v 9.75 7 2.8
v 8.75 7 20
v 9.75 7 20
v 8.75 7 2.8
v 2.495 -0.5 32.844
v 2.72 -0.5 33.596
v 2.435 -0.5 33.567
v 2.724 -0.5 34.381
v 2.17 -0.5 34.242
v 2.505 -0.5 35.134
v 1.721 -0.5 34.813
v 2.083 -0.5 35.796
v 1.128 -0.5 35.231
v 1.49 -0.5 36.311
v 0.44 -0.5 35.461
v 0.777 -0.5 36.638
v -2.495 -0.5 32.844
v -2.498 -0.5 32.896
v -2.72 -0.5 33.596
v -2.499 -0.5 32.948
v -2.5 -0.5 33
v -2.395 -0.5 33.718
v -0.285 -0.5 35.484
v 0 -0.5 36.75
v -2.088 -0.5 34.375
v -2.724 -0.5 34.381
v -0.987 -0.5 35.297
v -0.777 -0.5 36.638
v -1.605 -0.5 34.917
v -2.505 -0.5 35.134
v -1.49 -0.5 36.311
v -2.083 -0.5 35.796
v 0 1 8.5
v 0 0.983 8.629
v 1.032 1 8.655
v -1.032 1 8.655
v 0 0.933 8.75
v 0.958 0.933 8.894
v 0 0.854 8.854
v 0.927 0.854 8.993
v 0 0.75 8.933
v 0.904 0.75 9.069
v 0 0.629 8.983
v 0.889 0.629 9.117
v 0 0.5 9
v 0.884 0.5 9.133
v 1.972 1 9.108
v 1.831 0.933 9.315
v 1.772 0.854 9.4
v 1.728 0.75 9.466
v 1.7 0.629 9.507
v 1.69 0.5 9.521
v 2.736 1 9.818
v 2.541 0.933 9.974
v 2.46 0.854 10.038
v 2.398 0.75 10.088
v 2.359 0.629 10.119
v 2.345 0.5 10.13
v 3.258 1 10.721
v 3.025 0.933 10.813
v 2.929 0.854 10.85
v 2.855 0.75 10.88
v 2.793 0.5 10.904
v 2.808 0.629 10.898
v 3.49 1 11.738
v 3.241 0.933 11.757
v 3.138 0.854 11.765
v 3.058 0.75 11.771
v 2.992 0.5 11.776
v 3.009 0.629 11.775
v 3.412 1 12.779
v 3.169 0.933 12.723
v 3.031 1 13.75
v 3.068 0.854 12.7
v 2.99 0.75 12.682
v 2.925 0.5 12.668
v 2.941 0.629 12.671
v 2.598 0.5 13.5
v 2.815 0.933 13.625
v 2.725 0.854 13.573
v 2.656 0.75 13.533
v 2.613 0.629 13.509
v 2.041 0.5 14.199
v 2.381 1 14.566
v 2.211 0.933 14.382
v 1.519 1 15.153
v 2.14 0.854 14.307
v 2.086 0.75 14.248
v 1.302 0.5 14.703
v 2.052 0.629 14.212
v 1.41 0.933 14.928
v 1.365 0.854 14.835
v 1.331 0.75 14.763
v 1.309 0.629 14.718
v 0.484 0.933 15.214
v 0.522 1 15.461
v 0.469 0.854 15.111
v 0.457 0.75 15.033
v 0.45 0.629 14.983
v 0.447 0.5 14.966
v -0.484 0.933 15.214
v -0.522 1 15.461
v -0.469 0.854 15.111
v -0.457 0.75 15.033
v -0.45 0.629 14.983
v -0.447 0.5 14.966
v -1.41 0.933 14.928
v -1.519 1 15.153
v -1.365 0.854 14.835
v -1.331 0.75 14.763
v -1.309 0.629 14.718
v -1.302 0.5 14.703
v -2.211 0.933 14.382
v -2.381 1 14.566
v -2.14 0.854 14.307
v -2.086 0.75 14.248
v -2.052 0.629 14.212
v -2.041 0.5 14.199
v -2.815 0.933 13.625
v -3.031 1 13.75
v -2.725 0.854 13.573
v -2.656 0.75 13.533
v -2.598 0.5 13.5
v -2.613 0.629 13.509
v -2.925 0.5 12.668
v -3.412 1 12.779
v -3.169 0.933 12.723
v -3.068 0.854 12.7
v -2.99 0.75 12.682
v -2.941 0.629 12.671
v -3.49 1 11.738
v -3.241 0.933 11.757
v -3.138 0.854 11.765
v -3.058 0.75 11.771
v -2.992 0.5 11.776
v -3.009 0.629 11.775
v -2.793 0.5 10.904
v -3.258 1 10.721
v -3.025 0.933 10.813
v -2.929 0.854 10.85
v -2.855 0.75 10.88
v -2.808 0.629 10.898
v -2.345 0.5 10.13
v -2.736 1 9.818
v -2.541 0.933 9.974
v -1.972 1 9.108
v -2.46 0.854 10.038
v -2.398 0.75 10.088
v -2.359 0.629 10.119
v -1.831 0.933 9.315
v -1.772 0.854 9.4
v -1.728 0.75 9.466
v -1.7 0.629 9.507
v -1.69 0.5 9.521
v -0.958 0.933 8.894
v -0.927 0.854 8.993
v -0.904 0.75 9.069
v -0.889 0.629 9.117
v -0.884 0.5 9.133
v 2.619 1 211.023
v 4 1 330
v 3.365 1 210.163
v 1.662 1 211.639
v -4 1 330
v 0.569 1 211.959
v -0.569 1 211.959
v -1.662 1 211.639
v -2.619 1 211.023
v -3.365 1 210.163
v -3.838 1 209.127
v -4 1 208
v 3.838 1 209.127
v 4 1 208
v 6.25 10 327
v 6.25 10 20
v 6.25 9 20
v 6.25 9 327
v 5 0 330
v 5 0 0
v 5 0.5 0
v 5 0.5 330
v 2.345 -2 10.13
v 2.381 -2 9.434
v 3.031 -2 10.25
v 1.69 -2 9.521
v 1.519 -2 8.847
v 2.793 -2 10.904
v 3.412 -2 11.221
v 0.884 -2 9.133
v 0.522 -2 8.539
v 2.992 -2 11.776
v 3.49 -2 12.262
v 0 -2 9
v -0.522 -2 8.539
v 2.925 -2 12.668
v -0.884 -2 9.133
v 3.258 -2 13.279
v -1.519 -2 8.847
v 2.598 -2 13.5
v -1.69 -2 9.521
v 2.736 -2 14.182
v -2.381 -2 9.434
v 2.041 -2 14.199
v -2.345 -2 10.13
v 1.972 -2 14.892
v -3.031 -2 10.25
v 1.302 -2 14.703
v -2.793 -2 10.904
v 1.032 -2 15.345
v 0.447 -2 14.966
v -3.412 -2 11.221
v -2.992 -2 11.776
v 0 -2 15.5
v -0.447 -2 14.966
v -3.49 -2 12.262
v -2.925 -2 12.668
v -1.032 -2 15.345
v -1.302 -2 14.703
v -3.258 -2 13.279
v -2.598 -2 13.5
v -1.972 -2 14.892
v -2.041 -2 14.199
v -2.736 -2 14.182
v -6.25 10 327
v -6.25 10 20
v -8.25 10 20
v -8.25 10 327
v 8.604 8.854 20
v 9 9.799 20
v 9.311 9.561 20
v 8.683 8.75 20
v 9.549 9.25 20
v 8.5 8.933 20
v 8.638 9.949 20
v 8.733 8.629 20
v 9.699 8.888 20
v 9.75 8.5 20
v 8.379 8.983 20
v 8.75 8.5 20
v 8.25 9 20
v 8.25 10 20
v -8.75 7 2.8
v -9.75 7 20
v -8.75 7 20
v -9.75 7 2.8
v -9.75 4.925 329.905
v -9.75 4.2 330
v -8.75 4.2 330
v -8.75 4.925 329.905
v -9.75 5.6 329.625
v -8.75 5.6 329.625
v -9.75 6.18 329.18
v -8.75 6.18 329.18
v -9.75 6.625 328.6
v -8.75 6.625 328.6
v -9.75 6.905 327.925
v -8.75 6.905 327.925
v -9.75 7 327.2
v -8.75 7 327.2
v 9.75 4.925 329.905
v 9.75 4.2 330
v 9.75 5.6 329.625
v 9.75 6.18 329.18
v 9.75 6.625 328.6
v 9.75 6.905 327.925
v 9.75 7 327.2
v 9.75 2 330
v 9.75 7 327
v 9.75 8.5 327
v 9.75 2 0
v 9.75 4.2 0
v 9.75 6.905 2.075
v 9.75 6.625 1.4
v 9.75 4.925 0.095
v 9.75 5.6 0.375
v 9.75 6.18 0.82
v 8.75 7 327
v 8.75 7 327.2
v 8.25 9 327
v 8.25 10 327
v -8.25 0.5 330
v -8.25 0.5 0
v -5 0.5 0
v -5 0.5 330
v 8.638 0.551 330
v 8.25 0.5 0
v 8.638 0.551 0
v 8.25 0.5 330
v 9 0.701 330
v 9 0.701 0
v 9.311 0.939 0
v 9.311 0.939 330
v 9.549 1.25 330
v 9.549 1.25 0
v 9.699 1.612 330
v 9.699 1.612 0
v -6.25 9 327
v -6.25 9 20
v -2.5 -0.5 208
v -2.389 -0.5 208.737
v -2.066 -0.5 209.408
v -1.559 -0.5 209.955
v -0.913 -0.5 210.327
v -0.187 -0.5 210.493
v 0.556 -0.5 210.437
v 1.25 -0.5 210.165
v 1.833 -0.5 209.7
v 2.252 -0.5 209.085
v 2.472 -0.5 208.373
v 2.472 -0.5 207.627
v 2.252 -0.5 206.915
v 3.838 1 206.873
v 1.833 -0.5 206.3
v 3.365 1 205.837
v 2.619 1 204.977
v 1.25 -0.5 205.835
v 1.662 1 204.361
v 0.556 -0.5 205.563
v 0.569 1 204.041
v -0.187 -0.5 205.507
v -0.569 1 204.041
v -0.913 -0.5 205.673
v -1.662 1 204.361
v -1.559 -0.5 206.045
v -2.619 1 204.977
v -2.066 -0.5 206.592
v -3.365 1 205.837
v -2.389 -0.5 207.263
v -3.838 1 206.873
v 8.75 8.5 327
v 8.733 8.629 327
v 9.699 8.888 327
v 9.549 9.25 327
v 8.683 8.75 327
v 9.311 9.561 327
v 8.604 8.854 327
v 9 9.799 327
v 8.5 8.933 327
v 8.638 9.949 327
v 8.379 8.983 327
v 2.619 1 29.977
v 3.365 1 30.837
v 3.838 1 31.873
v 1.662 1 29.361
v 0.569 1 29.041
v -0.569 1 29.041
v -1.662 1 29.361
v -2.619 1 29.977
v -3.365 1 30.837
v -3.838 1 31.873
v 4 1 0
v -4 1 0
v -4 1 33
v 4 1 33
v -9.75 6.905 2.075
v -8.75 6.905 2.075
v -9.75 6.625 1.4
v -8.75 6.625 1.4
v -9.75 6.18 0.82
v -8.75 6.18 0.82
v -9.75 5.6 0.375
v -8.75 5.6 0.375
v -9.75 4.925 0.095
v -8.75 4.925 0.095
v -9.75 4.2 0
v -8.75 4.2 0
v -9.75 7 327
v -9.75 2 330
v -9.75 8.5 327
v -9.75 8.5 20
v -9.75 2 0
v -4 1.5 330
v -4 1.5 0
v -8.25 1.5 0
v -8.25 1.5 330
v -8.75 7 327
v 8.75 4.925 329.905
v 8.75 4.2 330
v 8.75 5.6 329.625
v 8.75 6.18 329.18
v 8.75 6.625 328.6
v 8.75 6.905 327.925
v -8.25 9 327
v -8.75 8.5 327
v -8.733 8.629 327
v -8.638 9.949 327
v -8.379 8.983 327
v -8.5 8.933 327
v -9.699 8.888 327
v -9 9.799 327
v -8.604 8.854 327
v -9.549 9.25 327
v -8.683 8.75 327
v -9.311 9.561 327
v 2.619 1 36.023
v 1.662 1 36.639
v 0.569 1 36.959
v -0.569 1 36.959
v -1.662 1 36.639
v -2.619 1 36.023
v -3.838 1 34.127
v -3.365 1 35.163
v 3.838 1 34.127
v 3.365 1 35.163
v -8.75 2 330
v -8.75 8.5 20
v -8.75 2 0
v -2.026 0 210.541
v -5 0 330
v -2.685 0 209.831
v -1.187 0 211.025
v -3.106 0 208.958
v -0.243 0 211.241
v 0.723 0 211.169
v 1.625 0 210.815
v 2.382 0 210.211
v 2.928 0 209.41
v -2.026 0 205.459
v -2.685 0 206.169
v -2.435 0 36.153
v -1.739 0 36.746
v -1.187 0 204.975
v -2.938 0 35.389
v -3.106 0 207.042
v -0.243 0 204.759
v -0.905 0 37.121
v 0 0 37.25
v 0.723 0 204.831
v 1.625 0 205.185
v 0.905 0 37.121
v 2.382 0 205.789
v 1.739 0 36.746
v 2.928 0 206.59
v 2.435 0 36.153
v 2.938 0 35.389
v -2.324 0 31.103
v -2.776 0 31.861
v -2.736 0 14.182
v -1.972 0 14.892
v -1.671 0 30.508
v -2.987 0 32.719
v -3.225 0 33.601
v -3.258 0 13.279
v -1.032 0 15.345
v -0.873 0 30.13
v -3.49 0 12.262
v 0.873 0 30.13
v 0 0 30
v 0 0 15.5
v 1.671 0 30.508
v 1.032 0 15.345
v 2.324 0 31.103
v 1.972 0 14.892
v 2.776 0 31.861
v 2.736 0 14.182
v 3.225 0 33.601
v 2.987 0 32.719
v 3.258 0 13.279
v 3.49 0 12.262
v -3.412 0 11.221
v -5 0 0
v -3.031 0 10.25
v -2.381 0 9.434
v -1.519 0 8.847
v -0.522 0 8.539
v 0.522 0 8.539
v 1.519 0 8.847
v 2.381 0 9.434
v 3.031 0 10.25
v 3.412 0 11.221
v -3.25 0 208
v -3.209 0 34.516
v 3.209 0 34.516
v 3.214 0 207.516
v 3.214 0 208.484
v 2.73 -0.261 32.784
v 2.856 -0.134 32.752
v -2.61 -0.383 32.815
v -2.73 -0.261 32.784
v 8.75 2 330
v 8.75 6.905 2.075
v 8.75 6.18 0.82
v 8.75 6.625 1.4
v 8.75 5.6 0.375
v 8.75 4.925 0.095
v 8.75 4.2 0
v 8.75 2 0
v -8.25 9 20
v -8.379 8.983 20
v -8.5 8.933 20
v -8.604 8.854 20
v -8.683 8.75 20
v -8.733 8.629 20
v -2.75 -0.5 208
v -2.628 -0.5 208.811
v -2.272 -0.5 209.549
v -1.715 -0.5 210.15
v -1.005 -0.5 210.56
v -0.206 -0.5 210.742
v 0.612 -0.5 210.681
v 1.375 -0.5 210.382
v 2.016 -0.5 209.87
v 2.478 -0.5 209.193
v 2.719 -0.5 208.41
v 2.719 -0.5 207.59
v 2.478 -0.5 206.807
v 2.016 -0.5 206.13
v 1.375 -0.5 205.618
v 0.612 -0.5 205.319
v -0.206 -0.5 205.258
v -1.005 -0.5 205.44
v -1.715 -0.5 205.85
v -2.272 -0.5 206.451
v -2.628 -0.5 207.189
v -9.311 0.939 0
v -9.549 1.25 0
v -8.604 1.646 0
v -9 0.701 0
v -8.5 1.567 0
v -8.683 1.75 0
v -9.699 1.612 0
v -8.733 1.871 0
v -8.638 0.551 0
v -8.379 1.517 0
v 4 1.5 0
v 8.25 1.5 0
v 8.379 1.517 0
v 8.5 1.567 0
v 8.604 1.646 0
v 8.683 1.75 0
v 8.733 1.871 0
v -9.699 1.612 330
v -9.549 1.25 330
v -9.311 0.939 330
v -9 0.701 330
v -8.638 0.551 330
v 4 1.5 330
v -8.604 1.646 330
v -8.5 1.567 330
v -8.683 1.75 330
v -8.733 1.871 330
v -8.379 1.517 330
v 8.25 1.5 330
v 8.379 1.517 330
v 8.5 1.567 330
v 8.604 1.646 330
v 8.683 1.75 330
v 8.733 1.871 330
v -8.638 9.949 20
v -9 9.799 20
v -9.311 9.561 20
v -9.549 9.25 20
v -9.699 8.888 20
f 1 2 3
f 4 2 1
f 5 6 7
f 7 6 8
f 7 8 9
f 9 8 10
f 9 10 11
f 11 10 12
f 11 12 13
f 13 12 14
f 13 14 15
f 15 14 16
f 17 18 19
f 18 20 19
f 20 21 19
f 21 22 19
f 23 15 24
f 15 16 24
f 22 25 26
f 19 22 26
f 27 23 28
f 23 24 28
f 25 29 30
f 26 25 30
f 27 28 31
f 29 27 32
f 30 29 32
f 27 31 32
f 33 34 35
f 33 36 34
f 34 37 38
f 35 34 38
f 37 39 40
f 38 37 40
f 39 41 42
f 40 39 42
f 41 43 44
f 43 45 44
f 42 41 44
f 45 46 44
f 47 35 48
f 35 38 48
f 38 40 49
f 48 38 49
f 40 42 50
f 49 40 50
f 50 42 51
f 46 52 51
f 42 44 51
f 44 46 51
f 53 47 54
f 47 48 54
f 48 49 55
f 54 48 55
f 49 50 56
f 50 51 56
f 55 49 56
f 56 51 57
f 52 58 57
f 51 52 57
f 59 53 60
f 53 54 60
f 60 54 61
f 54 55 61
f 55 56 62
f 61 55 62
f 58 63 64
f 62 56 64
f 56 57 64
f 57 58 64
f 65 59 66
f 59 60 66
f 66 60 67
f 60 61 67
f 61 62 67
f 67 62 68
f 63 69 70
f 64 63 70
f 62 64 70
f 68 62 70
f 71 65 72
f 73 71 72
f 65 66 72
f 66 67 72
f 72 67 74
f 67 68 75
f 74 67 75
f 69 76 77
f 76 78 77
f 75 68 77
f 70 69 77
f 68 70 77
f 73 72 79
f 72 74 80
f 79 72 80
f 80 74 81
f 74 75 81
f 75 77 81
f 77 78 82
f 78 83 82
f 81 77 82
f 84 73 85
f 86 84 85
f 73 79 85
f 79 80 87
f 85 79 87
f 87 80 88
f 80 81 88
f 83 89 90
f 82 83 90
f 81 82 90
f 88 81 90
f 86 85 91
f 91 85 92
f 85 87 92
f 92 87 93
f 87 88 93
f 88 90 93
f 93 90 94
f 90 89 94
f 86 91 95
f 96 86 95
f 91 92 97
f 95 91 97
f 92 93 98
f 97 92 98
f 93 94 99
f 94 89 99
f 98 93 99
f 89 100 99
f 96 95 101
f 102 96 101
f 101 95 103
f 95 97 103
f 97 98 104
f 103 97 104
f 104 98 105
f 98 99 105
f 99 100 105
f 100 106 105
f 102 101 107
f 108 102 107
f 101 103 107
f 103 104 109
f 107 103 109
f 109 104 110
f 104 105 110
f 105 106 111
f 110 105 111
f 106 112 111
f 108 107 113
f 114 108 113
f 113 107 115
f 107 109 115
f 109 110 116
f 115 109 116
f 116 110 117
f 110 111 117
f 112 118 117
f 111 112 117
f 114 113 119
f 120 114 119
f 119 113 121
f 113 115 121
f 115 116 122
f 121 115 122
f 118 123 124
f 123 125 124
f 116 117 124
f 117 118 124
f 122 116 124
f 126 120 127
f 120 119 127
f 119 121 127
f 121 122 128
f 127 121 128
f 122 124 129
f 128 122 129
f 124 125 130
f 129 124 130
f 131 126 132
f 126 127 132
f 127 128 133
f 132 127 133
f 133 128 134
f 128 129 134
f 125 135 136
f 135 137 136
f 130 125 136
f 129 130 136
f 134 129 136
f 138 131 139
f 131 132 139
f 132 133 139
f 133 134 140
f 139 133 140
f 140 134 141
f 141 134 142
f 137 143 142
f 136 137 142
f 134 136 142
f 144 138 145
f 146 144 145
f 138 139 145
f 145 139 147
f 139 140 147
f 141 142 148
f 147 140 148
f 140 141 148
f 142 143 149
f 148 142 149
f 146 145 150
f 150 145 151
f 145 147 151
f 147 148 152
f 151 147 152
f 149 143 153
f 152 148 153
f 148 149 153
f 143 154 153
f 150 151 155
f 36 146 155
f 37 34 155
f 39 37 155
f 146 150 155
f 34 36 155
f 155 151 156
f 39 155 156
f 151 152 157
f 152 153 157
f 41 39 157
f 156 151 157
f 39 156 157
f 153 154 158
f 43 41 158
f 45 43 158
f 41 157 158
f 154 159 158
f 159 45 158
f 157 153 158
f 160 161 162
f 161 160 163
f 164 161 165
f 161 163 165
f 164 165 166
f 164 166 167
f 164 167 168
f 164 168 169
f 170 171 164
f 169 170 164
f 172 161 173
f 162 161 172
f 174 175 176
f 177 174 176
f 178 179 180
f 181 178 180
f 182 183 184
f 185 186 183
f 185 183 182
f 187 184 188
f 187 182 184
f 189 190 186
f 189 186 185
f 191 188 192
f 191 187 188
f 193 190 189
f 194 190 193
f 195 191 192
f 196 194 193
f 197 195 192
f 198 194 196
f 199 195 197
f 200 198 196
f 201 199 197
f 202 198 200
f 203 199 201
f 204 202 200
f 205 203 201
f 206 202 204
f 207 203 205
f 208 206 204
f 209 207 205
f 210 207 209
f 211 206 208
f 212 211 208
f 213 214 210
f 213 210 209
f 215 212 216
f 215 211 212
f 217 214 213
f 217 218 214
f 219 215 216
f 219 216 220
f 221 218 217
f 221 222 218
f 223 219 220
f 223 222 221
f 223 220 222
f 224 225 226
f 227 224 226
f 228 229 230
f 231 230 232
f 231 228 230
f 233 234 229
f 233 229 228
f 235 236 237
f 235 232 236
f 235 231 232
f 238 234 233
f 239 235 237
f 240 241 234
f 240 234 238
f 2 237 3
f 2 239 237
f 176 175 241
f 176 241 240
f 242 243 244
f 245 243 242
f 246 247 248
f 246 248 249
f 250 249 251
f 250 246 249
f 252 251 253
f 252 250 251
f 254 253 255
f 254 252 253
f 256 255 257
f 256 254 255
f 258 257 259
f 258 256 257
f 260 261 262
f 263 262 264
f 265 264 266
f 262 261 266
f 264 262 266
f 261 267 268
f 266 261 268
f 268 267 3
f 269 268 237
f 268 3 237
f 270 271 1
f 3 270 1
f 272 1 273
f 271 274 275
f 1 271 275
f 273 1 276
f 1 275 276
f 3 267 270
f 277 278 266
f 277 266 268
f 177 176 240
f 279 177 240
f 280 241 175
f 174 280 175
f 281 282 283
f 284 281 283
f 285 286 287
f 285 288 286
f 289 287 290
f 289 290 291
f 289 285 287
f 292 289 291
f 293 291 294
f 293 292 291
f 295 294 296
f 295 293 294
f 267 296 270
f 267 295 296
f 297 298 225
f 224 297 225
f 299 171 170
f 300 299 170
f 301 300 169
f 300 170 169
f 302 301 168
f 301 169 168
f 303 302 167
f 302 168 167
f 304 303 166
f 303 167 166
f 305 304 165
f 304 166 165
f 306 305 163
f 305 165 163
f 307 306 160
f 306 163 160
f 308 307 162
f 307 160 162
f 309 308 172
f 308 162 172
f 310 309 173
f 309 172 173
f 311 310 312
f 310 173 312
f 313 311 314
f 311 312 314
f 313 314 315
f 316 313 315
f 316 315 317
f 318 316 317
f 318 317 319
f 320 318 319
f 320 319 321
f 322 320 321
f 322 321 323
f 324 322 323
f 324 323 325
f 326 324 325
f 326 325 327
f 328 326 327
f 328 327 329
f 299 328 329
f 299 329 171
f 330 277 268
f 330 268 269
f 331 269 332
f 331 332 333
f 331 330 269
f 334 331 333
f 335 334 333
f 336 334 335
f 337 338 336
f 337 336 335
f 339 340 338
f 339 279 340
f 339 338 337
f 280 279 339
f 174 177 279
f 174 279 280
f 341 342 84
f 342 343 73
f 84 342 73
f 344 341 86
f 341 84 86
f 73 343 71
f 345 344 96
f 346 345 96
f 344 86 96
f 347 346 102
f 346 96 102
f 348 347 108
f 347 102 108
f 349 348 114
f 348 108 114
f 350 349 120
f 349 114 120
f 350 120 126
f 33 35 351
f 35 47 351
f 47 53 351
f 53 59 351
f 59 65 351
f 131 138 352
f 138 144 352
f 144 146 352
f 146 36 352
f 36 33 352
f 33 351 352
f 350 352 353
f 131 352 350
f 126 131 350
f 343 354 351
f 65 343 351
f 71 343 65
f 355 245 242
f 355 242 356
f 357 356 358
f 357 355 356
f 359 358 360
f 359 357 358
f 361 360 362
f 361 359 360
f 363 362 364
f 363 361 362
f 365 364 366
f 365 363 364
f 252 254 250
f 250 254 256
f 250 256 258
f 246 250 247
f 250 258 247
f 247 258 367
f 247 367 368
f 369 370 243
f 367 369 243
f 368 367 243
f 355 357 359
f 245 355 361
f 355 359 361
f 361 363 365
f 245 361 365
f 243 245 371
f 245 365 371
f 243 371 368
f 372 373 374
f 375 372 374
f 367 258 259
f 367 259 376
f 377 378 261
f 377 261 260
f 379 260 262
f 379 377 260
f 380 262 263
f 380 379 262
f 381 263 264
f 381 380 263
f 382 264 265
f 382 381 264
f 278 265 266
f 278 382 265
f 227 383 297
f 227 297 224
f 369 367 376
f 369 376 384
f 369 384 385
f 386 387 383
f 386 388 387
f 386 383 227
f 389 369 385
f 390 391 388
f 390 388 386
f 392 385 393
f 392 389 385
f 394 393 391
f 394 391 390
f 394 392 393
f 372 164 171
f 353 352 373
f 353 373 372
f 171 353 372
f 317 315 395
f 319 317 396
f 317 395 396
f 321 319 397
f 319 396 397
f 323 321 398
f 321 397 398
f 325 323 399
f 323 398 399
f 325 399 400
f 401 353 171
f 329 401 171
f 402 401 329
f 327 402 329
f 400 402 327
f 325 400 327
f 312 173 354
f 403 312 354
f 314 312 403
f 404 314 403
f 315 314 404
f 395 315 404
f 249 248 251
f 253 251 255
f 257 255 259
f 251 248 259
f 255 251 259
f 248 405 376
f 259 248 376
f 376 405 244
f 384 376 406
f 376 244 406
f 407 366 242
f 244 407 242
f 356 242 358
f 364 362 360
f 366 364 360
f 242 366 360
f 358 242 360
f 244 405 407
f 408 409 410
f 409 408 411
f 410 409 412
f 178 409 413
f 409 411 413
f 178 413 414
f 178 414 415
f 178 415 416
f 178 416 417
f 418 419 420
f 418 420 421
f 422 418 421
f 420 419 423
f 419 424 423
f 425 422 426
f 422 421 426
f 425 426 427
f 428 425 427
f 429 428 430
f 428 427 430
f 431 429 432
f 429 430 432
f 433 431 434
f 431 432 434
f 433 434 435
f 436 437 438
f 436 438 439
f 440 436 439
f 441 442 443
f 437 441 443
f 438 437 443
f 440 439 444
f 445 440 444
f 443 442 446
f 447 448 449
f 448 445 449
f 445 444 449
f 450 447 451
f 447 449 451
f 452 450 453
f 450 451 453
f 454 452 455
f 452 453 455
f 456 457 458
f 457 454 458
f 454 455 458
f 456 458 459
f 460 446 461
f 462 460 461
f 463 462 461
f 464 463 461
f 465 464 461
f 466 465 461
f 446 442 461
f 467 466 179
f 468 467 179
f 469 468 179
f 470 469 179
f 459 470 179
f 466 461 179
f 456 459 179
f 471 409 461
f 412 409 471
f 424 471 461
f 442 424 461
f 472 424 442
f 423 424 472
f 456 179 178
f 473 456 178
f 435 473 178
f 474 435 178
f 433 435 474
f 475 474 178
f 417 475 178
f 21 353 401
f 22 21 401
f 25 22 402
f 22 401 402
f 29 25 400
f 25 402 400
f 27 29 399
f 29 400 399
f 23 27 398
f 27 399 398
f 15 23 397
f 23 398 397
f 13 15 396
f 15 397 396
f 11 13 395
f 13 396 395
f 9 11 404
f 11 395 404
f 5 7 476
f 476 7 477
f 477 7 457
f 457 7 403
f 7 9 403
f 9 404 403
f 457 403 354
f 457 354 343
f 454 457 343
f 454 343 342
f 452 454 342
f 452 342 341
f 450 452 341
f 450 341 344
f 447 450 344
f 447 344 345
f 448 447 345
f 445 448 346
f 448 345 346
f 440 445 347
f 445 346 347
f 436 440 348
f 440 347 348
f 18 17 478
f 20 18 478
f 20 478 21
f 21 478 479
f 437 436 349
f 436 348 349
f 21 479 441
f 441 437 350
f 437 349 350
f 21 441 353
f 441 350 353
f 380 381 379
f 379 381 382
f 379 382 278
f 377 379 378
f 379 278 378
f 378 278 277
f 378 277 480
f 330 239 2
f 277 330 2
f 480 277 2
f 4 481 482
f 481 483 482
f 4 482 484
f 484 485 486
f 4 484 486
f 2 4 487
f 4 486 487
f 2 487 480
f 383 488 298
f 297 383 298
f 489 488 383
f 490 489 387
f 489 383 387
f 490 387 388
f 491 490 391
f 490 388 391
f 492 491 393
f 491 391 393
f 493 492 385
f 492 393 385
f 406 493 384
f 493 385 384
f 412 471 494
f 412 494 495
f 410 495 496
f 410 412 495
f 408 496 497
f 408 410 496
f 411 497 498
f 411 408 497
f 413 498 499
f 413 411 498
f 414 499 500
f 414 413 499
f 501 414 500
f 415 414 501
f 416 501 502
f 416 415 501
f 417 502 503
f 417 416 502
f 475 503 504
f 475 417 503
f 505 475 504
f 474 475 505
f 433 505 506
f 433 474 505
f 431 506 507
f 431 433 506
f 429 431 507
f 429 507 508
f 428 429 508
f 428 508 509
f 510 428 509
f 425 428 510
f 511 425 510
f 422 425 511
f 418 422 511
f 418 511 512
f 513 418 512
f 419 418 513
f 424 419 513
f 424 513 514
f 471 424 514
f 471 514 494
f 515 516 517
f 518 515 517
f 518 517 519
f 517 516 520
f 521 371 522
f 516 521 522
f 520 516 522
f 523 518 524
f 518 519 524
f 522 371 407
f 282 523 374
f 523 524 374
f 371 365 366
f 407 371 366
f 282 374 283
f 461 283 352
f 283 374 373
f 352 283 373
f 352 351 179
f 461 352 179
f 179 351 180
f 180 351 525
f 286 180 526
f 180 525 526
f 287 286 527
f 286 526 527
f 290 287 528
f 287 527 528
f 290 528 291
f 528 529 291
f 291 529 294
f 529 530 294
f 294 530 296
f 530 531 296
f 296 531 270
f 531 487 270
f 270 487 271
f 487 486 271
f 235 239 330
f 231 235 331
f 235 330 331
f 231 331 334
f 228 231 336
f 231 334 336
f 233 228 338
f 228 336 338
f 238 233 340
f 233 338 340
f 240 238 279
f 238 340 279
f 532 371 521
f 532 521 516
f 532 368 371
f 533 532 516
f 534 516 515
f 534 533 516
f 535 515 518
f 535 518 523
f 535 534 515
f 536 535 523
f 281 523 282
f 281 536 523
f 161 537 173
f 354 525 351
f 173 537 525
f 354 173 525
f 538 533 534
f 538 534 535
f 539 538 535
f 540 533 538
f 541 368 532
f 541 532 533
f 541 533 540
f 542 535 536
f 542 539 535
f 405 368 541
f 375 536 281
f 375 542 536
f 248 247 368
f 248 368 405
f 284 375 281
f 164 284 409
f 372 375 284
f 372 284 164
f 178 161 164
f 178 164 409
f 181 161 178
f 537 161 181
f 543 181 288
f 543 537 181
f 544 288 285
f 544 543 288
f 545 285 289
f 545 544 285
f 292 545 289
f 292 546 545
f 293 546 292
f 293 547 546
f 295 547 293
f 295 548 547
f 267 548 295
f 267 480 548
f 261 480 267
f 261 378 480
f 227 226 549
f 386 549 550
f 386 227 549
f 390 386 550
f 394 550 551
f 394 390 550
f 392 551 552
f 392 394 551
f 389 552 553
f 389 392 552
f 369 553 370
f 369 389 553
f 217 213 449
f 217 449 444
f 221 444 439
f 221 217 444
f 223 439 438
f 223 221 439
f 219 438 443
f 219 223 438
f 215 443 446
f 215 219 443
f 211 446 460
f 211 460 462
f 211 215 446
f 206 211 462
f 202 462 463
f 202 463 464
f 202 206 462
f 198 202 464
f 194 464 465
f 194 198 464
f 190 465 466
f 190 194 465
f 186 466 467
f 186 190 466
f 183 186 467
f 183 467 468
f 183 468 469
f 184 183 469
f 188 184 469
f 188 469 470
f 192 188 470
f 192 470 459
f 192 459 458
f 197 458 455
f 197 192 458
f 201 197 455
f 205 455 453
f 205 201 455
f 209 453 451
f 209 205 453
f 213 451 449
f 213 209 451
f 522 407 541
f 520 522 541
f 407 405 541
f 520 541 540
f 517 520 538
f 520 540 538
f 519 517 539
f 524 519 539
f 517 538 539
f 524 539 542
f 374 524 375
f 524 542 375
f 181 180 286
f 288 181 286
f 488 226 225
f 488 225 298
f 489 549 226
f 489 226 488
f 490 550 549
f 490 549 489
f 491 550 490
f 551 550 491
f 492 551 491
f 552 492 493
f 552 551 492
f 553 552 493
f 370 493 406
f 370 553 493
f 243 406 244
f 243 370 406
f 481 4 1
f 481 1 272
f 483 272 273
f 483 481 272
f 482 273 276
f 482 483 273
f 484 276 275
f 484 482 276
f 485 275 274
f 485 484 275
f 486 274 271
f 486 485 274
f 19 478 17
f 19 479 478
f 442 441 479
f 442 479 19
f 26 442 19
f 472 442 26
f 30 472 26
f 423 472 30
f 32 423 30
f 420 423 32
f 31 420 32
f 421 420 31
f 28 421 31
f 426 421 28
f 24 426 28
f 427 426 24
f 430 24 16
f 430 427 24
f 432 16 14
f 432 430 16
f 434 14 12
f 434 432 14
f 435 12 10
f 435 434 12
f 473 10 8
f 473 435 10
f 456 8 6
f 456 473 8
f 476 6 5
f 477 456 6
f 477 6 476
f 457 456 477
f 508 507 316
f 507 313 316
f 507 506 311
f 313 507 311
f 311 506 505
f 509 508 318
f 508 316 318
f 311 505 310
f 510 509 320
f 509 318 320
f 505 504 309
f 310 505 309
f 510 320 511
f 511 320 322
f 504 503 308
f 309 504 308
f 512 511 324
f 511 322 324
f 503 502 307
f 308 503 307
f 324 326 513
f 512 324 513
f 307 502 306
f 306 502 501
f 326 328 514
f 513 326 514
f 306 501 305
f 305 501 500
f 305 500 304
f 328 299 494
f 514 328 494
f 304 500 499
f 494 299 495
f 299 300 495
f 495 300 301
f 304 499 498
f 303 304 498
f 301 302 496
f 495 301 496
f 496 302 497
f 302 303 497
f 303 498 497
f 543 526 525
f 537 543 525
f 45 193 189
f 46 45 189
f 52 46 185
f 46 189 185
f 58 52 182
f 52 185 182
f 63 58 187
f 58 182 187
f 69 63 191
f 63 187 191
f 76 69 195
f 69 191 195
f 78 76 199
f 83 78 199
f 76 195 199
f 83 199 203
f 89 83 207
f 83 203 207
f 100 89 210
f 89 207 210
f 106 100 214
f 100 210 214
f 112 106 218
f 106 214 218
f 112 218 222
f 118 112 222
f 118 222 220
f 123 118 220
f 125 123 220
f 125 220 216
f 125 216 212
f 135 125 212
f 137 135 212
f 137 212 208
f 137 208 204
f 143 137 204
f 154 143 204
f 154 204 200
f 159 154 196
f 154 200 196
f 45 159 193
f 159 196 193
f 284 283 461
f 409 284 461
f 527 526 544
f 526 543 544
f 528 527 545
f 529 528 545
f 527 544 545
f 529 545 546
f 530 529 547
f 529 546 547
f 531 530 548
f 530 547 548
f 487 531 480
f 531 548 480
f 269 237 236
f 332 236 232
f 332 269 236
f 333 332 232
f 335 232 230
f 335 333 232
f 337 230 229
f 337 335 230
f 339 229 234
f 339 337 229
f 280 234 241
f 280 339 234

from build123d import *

# Parameters (mm, degrees)
BASE_EXTRU_MINCE_DEPTH            = 330
CONG_1_R                          = 1.5
CONG_2_R                          = 0.5
ENL_V_MAT_EXTRU_1_DEPTH           = 331.295417013
ENL_V_MAT_EXTRU_1_DEPTH_BACK      = 331.295417013
ESQUISSE3_R                       = 3
ENL_V_MAT_EXTRU_4_DEPTH           = 3
BOSS_EXTRU_1_START                = 2
ESQUISSE4_R                       = 3.5
ESQUISSE4_R_2                     = 3
BOSS_EXTRU_1_DEPTH                = 2
CONG_3_R                          = 0.5
ESQUISSE5_R                       = 4.25
BOSS_EXTRU_2_DEPTH                = 1.5
BOSS_EXTRU_2_DRAFT                = -45
BOSS_EXTRU_2_PROFILE_2_DEPTH      = 1.5
BOSS_EXTRU_2_PROFILE_2_DRAFT      = -45
ESQUISSE6_R                       = 4
ENL_V_MAT_EXTRU_6_DEPTH           = 2
ENL_V_MAT_EXTRU_6_DRAFT           = -45
ENL_V_MAT_EXTRU_6_PROFILE_2_DEPTH = 2
ENL_V_MAT_EXTRU_6_PROFILE_2_DRAFT = -45


with BuildPart() as part:
    # Esquisse1 → Base-Extru.-Mince (new body)
    with BuildSketch(Plane.XY):
        Polygon((-6.25, 10), (-9.75, 10), (-9.75, 0.5), (-5, 0.5), (-5, 0), (5, 0), (5, 0.5), (9.75, 0.5), (9.75, 10), (6.25, 10), (6.25, 9), (8.75, 9), (8.75, 1.5), (4, 1.5), (4, 1), (-4, 1), (-4, 1.5), (-8.75, 1.5), (-8.75, 9), (-6.25, 9), align=None)
    extrude(amount=BASE_EXTRU_MINCE_DEPTH)

    # Congé1
    cong_1_edges = [part.edges().sort_by_distance(p)[0] for p in [
        (-9.75, 10, 165),
        (-9.75, 0.5, 165),
        (9.75, 0.5, 165),
        (9.75, 10, 165),
    ]]
    fillet(cong_1_edges, radius=CONG_1_R)

    # Congé2
    cong_2_edges = [part.edges().sort_by_distance(p)[0] for p in [
        (-8.75, 9, 165),
        (-8.75, 1.5, 165),
        (8.75, 1.5, 165),
        (8.75, 9, 165),
    ]]
    fillet(cong_2_edges, radius=CONG_2_R)

    # Esquisse2 → Enlèv. mat.-Extru.1 (cut, two sides: drawn at the far end of the back side and taken through both)
    with BuildSketch(Plane(origin=(0, 0, 0), x_dir=(0, 0, -1), z_dir=(1, 0, 0)).offset(-ENL_V_MAT_EXTRU_1_DEPTH_BACK)):
        with BuildLine():
            Line((-330, 0), (-330, 4.2))
            ThreePointArc((-330, 4.2), (-329.179898987, 6.179898987), (-327.2, 7))
            Line((-327.2, 7), (-327, 7))
            Line((-327, 7), (-327, 10))
            Line((-327, 10), (-332.428830769, 10))
            Line((-332.428830769, 10), (-332.428830769, 0))
            Line((-332.428830769, 0), (-330, 0))
        make_face()
        with BuildLine():
            Line((0.919813001, 11.16366228), (-20, 11.16366228))
            Line((-20, 11.16366228), (-20, 7))
            Line((-20, 7), (-2.8, 7))
            ThreePointArc((-2.8, 7), (-0.820101013, 6.179898987), (0, 4.2))
            Line((0, 4.2), (0, 0))
            Line((0, 0), (0.919813001, 0))
            Line((0.919813001, 0), (0.919813001, 11.16366228))
        make_face()
    extrude(amount=ENL_V_MAT_EXTRU_1_DEPTH + ENL_V_MAT_EXTRU_1_DEPTH_BACK, mode=Mode.SUBTRACT)

    # Esquisse3 → Enlèv. mat.-Extru.4 (cut)
    with BuildSketch(Plane(origin=(0, 0, 0), x_dir=(1, 0, 0), z_dir=(0, 1, 0))):
        with Locations(Location((0, -12, 0), (0, 0, 90))):
            Circle(ESQUISSE3_R)
    extrude(amount=ENL_V_MAT_EXTRU_4_DEPTH, mode=Mode.SUBTRACT)

    # Esquisse4 → Boss.-Extru.1 (add)
    with BuildSketch(Plane.XZ.offset(BOSS_EXTRU_1_START)):
        with Locations(Location((0, 12, 0), (0, 0, 90))):
            Circle(ESQUISSE4_R)
        with Locations(Location((0, 12, 0), (0, 0, 270))):
            Circle(ESQUISSE4_R_2, mode=Mode.SUBTRACT)
    extrude(amount=-BOSS_EXTRU_1_DEPTH)

    # Congé3
    cong_3_edges = [part.edges().sort_by_distance(p)[0] for p in [
        (0, 1, 15),
    ]]
    fillet(cong_3_edges, radius=CONG_3_R)


with BuildPart() as boss_extru_2_tool:
    # Esquisse5 → Boss.-Extru.2 (with draft: the straight prism first)
    with BuildSketch(Plane(origin=(0, 1, 0), x_dir=(-1, 0, 0), z_dir=(0, 1, 0))):
        with Locations((0, 208)):
            Circle(ESQUISSE5_R)
    extrude(amount=-BOSS_EXTRU_2_DEPTH)
    # Boss.-Extru.2: the draft: its side faces are tilted about the plane it starts from
    boss_extru_2_sides = [boss_extru_2_tool.faces().sort_by_distance(p)[0] for p in [
        (4.25, 0.25, 208),
    ]]
    draft(boss_extru_2_sides, Plane(origin=(0, 1, 0), x_dir=(-1, 0, 0), z_dir=(0, 1, 0)), BOSS_EXTRU_2_DRAFT)


with BuildPart() as part_1:
    add(part.part)

    # Boss.-Extru.2: add boss_extru_2_tool
    add(boss_extru_2_tool.part)


with BuildPart() as boss_extru_2_profile_2_tool:
    # Esquisse5 → Boss.-Extru.2 profile 2 (with draft: the straight prism first)
    with BuildSketch(Plane(origin=(0, 1, 0), x_dir=(-1, 0, 0), z_dir=(0, 1, 0))):
        with Locations((0, 34)):
            Circle(ESQUISSE5_R)
    extrude(amount=-BOSS_EXTRU_2_PROFILE_2_DEPTH)
    # Boss.-Extru.2 profile 2: the draft: its side faces are tilted about the plane it starts from
    boss_extru_2_profile_2_sides = [boss_extru_2_profile_2_tool.faces().sort_by_distance(p)[0] for p in [
        (4.25, 0.25, 34),
    ]]
    draft(boss_extru_2_profile_2_sides, Plane(origin=(0, 1, 0), x_dir=(-1, 0, 0), z_dir=(0, 1, 0)), BOSS_EXTRU_2_PROFILE_2_DRAFT)


with BuildPart() as part_2:
    add(part_1.part)

    # Boss.-Extru.2 profile 2: add boss_extru_2_profile_2_tool
    add(boss_extru_2_profile_2_tool.part)


with BuildPart() as enl_v_mat_extru_6_tool:
    # Esquisse6 → Enlèv. mat.-Extru.6 (with draft: the straight prism first)
    with BuildSketch(Plane(origin=(0, 1, 0), x_dir=(-1, 0, 0), z_dir=(0, 1, 0))):
        with Locations((0, 33)):
            Circle(ESQUISSE6_R)
    extrude(amount=-ENL_V_MAT_EXTRU_6_DEPTH)
    # Enlèv. mat.-Extru.6: the draft: its side faces are tilted about the plane it starts from
    enl_v_mat_extru_6_sides = [enl_v_mat_extru_6_tool.faces().sort_by_distance(p)[0] for p in [
        (4, 0, 33),
    ]]
    draft(enl_v_mat_extru_6_sides, Plane(origin=(0, 1, 0), x_dir=(-1, 0, 0), z_dir=(0, 1, 0)), ENL_V_MAT_EXTRU_6_DRAFT)


with BuildPart() as part_3:
    add(part_2.part)

    # Enlèv. mat.-Extru.6: cut by enl_v_mat_extru_6_tool
    add(enl_v_mat_extru_6_tool.part, mode=Mode.SUBTRACT)


with BuildPart() as enl_v_mat_extru_6_profile_2_tool:
    # Esquisse6 → Enlèv. mat.-Extru.6 profile 2 (with draft: the straight prism first)
    with BuildSketch(Plane(origin=(0, 1, 0), x_dir=(-1, 0, 0), z_dir=(0, 1, 0))):
        with Locations((0, 208)):
            Circle(ESQUISSE6_R)
    extrude(amount=-ENL_V_MAT_EXTRU_6_PROFILE_2_DEPTH)
    # Enlèv. mat.-Extru.6 profile 2: the draft: its side faces are tilted about the plane it starts from
    enl_v_mat_extru_6_profile_2_sides = [enl_v_mat_extru_6_profile_2_tool.faces().sort_by_distance(p)[0] for p in [
        (4, 0, 208),
    ]]
    draft(enl_v_mat_extru_6_profile_2_sides, Plane(origin=(0, 1, 0), x_dir=(-1, 0, 0), z_dir=(0, 1, 0)), ENL_V_MAT_EXTRU_6_PROFILE_2_DRAFT)


with BuildPart() as part_4:
    add(part_3.part)

    # Enlèv. mat.-Extru.6 profile 2: cut by enl_v_mat_extru_6_profile_2_tool
    add(enl_v_mat_extru_6_profile_2_tool.part, mode=Mode.SUBTRACT)


solid = part_4.part
